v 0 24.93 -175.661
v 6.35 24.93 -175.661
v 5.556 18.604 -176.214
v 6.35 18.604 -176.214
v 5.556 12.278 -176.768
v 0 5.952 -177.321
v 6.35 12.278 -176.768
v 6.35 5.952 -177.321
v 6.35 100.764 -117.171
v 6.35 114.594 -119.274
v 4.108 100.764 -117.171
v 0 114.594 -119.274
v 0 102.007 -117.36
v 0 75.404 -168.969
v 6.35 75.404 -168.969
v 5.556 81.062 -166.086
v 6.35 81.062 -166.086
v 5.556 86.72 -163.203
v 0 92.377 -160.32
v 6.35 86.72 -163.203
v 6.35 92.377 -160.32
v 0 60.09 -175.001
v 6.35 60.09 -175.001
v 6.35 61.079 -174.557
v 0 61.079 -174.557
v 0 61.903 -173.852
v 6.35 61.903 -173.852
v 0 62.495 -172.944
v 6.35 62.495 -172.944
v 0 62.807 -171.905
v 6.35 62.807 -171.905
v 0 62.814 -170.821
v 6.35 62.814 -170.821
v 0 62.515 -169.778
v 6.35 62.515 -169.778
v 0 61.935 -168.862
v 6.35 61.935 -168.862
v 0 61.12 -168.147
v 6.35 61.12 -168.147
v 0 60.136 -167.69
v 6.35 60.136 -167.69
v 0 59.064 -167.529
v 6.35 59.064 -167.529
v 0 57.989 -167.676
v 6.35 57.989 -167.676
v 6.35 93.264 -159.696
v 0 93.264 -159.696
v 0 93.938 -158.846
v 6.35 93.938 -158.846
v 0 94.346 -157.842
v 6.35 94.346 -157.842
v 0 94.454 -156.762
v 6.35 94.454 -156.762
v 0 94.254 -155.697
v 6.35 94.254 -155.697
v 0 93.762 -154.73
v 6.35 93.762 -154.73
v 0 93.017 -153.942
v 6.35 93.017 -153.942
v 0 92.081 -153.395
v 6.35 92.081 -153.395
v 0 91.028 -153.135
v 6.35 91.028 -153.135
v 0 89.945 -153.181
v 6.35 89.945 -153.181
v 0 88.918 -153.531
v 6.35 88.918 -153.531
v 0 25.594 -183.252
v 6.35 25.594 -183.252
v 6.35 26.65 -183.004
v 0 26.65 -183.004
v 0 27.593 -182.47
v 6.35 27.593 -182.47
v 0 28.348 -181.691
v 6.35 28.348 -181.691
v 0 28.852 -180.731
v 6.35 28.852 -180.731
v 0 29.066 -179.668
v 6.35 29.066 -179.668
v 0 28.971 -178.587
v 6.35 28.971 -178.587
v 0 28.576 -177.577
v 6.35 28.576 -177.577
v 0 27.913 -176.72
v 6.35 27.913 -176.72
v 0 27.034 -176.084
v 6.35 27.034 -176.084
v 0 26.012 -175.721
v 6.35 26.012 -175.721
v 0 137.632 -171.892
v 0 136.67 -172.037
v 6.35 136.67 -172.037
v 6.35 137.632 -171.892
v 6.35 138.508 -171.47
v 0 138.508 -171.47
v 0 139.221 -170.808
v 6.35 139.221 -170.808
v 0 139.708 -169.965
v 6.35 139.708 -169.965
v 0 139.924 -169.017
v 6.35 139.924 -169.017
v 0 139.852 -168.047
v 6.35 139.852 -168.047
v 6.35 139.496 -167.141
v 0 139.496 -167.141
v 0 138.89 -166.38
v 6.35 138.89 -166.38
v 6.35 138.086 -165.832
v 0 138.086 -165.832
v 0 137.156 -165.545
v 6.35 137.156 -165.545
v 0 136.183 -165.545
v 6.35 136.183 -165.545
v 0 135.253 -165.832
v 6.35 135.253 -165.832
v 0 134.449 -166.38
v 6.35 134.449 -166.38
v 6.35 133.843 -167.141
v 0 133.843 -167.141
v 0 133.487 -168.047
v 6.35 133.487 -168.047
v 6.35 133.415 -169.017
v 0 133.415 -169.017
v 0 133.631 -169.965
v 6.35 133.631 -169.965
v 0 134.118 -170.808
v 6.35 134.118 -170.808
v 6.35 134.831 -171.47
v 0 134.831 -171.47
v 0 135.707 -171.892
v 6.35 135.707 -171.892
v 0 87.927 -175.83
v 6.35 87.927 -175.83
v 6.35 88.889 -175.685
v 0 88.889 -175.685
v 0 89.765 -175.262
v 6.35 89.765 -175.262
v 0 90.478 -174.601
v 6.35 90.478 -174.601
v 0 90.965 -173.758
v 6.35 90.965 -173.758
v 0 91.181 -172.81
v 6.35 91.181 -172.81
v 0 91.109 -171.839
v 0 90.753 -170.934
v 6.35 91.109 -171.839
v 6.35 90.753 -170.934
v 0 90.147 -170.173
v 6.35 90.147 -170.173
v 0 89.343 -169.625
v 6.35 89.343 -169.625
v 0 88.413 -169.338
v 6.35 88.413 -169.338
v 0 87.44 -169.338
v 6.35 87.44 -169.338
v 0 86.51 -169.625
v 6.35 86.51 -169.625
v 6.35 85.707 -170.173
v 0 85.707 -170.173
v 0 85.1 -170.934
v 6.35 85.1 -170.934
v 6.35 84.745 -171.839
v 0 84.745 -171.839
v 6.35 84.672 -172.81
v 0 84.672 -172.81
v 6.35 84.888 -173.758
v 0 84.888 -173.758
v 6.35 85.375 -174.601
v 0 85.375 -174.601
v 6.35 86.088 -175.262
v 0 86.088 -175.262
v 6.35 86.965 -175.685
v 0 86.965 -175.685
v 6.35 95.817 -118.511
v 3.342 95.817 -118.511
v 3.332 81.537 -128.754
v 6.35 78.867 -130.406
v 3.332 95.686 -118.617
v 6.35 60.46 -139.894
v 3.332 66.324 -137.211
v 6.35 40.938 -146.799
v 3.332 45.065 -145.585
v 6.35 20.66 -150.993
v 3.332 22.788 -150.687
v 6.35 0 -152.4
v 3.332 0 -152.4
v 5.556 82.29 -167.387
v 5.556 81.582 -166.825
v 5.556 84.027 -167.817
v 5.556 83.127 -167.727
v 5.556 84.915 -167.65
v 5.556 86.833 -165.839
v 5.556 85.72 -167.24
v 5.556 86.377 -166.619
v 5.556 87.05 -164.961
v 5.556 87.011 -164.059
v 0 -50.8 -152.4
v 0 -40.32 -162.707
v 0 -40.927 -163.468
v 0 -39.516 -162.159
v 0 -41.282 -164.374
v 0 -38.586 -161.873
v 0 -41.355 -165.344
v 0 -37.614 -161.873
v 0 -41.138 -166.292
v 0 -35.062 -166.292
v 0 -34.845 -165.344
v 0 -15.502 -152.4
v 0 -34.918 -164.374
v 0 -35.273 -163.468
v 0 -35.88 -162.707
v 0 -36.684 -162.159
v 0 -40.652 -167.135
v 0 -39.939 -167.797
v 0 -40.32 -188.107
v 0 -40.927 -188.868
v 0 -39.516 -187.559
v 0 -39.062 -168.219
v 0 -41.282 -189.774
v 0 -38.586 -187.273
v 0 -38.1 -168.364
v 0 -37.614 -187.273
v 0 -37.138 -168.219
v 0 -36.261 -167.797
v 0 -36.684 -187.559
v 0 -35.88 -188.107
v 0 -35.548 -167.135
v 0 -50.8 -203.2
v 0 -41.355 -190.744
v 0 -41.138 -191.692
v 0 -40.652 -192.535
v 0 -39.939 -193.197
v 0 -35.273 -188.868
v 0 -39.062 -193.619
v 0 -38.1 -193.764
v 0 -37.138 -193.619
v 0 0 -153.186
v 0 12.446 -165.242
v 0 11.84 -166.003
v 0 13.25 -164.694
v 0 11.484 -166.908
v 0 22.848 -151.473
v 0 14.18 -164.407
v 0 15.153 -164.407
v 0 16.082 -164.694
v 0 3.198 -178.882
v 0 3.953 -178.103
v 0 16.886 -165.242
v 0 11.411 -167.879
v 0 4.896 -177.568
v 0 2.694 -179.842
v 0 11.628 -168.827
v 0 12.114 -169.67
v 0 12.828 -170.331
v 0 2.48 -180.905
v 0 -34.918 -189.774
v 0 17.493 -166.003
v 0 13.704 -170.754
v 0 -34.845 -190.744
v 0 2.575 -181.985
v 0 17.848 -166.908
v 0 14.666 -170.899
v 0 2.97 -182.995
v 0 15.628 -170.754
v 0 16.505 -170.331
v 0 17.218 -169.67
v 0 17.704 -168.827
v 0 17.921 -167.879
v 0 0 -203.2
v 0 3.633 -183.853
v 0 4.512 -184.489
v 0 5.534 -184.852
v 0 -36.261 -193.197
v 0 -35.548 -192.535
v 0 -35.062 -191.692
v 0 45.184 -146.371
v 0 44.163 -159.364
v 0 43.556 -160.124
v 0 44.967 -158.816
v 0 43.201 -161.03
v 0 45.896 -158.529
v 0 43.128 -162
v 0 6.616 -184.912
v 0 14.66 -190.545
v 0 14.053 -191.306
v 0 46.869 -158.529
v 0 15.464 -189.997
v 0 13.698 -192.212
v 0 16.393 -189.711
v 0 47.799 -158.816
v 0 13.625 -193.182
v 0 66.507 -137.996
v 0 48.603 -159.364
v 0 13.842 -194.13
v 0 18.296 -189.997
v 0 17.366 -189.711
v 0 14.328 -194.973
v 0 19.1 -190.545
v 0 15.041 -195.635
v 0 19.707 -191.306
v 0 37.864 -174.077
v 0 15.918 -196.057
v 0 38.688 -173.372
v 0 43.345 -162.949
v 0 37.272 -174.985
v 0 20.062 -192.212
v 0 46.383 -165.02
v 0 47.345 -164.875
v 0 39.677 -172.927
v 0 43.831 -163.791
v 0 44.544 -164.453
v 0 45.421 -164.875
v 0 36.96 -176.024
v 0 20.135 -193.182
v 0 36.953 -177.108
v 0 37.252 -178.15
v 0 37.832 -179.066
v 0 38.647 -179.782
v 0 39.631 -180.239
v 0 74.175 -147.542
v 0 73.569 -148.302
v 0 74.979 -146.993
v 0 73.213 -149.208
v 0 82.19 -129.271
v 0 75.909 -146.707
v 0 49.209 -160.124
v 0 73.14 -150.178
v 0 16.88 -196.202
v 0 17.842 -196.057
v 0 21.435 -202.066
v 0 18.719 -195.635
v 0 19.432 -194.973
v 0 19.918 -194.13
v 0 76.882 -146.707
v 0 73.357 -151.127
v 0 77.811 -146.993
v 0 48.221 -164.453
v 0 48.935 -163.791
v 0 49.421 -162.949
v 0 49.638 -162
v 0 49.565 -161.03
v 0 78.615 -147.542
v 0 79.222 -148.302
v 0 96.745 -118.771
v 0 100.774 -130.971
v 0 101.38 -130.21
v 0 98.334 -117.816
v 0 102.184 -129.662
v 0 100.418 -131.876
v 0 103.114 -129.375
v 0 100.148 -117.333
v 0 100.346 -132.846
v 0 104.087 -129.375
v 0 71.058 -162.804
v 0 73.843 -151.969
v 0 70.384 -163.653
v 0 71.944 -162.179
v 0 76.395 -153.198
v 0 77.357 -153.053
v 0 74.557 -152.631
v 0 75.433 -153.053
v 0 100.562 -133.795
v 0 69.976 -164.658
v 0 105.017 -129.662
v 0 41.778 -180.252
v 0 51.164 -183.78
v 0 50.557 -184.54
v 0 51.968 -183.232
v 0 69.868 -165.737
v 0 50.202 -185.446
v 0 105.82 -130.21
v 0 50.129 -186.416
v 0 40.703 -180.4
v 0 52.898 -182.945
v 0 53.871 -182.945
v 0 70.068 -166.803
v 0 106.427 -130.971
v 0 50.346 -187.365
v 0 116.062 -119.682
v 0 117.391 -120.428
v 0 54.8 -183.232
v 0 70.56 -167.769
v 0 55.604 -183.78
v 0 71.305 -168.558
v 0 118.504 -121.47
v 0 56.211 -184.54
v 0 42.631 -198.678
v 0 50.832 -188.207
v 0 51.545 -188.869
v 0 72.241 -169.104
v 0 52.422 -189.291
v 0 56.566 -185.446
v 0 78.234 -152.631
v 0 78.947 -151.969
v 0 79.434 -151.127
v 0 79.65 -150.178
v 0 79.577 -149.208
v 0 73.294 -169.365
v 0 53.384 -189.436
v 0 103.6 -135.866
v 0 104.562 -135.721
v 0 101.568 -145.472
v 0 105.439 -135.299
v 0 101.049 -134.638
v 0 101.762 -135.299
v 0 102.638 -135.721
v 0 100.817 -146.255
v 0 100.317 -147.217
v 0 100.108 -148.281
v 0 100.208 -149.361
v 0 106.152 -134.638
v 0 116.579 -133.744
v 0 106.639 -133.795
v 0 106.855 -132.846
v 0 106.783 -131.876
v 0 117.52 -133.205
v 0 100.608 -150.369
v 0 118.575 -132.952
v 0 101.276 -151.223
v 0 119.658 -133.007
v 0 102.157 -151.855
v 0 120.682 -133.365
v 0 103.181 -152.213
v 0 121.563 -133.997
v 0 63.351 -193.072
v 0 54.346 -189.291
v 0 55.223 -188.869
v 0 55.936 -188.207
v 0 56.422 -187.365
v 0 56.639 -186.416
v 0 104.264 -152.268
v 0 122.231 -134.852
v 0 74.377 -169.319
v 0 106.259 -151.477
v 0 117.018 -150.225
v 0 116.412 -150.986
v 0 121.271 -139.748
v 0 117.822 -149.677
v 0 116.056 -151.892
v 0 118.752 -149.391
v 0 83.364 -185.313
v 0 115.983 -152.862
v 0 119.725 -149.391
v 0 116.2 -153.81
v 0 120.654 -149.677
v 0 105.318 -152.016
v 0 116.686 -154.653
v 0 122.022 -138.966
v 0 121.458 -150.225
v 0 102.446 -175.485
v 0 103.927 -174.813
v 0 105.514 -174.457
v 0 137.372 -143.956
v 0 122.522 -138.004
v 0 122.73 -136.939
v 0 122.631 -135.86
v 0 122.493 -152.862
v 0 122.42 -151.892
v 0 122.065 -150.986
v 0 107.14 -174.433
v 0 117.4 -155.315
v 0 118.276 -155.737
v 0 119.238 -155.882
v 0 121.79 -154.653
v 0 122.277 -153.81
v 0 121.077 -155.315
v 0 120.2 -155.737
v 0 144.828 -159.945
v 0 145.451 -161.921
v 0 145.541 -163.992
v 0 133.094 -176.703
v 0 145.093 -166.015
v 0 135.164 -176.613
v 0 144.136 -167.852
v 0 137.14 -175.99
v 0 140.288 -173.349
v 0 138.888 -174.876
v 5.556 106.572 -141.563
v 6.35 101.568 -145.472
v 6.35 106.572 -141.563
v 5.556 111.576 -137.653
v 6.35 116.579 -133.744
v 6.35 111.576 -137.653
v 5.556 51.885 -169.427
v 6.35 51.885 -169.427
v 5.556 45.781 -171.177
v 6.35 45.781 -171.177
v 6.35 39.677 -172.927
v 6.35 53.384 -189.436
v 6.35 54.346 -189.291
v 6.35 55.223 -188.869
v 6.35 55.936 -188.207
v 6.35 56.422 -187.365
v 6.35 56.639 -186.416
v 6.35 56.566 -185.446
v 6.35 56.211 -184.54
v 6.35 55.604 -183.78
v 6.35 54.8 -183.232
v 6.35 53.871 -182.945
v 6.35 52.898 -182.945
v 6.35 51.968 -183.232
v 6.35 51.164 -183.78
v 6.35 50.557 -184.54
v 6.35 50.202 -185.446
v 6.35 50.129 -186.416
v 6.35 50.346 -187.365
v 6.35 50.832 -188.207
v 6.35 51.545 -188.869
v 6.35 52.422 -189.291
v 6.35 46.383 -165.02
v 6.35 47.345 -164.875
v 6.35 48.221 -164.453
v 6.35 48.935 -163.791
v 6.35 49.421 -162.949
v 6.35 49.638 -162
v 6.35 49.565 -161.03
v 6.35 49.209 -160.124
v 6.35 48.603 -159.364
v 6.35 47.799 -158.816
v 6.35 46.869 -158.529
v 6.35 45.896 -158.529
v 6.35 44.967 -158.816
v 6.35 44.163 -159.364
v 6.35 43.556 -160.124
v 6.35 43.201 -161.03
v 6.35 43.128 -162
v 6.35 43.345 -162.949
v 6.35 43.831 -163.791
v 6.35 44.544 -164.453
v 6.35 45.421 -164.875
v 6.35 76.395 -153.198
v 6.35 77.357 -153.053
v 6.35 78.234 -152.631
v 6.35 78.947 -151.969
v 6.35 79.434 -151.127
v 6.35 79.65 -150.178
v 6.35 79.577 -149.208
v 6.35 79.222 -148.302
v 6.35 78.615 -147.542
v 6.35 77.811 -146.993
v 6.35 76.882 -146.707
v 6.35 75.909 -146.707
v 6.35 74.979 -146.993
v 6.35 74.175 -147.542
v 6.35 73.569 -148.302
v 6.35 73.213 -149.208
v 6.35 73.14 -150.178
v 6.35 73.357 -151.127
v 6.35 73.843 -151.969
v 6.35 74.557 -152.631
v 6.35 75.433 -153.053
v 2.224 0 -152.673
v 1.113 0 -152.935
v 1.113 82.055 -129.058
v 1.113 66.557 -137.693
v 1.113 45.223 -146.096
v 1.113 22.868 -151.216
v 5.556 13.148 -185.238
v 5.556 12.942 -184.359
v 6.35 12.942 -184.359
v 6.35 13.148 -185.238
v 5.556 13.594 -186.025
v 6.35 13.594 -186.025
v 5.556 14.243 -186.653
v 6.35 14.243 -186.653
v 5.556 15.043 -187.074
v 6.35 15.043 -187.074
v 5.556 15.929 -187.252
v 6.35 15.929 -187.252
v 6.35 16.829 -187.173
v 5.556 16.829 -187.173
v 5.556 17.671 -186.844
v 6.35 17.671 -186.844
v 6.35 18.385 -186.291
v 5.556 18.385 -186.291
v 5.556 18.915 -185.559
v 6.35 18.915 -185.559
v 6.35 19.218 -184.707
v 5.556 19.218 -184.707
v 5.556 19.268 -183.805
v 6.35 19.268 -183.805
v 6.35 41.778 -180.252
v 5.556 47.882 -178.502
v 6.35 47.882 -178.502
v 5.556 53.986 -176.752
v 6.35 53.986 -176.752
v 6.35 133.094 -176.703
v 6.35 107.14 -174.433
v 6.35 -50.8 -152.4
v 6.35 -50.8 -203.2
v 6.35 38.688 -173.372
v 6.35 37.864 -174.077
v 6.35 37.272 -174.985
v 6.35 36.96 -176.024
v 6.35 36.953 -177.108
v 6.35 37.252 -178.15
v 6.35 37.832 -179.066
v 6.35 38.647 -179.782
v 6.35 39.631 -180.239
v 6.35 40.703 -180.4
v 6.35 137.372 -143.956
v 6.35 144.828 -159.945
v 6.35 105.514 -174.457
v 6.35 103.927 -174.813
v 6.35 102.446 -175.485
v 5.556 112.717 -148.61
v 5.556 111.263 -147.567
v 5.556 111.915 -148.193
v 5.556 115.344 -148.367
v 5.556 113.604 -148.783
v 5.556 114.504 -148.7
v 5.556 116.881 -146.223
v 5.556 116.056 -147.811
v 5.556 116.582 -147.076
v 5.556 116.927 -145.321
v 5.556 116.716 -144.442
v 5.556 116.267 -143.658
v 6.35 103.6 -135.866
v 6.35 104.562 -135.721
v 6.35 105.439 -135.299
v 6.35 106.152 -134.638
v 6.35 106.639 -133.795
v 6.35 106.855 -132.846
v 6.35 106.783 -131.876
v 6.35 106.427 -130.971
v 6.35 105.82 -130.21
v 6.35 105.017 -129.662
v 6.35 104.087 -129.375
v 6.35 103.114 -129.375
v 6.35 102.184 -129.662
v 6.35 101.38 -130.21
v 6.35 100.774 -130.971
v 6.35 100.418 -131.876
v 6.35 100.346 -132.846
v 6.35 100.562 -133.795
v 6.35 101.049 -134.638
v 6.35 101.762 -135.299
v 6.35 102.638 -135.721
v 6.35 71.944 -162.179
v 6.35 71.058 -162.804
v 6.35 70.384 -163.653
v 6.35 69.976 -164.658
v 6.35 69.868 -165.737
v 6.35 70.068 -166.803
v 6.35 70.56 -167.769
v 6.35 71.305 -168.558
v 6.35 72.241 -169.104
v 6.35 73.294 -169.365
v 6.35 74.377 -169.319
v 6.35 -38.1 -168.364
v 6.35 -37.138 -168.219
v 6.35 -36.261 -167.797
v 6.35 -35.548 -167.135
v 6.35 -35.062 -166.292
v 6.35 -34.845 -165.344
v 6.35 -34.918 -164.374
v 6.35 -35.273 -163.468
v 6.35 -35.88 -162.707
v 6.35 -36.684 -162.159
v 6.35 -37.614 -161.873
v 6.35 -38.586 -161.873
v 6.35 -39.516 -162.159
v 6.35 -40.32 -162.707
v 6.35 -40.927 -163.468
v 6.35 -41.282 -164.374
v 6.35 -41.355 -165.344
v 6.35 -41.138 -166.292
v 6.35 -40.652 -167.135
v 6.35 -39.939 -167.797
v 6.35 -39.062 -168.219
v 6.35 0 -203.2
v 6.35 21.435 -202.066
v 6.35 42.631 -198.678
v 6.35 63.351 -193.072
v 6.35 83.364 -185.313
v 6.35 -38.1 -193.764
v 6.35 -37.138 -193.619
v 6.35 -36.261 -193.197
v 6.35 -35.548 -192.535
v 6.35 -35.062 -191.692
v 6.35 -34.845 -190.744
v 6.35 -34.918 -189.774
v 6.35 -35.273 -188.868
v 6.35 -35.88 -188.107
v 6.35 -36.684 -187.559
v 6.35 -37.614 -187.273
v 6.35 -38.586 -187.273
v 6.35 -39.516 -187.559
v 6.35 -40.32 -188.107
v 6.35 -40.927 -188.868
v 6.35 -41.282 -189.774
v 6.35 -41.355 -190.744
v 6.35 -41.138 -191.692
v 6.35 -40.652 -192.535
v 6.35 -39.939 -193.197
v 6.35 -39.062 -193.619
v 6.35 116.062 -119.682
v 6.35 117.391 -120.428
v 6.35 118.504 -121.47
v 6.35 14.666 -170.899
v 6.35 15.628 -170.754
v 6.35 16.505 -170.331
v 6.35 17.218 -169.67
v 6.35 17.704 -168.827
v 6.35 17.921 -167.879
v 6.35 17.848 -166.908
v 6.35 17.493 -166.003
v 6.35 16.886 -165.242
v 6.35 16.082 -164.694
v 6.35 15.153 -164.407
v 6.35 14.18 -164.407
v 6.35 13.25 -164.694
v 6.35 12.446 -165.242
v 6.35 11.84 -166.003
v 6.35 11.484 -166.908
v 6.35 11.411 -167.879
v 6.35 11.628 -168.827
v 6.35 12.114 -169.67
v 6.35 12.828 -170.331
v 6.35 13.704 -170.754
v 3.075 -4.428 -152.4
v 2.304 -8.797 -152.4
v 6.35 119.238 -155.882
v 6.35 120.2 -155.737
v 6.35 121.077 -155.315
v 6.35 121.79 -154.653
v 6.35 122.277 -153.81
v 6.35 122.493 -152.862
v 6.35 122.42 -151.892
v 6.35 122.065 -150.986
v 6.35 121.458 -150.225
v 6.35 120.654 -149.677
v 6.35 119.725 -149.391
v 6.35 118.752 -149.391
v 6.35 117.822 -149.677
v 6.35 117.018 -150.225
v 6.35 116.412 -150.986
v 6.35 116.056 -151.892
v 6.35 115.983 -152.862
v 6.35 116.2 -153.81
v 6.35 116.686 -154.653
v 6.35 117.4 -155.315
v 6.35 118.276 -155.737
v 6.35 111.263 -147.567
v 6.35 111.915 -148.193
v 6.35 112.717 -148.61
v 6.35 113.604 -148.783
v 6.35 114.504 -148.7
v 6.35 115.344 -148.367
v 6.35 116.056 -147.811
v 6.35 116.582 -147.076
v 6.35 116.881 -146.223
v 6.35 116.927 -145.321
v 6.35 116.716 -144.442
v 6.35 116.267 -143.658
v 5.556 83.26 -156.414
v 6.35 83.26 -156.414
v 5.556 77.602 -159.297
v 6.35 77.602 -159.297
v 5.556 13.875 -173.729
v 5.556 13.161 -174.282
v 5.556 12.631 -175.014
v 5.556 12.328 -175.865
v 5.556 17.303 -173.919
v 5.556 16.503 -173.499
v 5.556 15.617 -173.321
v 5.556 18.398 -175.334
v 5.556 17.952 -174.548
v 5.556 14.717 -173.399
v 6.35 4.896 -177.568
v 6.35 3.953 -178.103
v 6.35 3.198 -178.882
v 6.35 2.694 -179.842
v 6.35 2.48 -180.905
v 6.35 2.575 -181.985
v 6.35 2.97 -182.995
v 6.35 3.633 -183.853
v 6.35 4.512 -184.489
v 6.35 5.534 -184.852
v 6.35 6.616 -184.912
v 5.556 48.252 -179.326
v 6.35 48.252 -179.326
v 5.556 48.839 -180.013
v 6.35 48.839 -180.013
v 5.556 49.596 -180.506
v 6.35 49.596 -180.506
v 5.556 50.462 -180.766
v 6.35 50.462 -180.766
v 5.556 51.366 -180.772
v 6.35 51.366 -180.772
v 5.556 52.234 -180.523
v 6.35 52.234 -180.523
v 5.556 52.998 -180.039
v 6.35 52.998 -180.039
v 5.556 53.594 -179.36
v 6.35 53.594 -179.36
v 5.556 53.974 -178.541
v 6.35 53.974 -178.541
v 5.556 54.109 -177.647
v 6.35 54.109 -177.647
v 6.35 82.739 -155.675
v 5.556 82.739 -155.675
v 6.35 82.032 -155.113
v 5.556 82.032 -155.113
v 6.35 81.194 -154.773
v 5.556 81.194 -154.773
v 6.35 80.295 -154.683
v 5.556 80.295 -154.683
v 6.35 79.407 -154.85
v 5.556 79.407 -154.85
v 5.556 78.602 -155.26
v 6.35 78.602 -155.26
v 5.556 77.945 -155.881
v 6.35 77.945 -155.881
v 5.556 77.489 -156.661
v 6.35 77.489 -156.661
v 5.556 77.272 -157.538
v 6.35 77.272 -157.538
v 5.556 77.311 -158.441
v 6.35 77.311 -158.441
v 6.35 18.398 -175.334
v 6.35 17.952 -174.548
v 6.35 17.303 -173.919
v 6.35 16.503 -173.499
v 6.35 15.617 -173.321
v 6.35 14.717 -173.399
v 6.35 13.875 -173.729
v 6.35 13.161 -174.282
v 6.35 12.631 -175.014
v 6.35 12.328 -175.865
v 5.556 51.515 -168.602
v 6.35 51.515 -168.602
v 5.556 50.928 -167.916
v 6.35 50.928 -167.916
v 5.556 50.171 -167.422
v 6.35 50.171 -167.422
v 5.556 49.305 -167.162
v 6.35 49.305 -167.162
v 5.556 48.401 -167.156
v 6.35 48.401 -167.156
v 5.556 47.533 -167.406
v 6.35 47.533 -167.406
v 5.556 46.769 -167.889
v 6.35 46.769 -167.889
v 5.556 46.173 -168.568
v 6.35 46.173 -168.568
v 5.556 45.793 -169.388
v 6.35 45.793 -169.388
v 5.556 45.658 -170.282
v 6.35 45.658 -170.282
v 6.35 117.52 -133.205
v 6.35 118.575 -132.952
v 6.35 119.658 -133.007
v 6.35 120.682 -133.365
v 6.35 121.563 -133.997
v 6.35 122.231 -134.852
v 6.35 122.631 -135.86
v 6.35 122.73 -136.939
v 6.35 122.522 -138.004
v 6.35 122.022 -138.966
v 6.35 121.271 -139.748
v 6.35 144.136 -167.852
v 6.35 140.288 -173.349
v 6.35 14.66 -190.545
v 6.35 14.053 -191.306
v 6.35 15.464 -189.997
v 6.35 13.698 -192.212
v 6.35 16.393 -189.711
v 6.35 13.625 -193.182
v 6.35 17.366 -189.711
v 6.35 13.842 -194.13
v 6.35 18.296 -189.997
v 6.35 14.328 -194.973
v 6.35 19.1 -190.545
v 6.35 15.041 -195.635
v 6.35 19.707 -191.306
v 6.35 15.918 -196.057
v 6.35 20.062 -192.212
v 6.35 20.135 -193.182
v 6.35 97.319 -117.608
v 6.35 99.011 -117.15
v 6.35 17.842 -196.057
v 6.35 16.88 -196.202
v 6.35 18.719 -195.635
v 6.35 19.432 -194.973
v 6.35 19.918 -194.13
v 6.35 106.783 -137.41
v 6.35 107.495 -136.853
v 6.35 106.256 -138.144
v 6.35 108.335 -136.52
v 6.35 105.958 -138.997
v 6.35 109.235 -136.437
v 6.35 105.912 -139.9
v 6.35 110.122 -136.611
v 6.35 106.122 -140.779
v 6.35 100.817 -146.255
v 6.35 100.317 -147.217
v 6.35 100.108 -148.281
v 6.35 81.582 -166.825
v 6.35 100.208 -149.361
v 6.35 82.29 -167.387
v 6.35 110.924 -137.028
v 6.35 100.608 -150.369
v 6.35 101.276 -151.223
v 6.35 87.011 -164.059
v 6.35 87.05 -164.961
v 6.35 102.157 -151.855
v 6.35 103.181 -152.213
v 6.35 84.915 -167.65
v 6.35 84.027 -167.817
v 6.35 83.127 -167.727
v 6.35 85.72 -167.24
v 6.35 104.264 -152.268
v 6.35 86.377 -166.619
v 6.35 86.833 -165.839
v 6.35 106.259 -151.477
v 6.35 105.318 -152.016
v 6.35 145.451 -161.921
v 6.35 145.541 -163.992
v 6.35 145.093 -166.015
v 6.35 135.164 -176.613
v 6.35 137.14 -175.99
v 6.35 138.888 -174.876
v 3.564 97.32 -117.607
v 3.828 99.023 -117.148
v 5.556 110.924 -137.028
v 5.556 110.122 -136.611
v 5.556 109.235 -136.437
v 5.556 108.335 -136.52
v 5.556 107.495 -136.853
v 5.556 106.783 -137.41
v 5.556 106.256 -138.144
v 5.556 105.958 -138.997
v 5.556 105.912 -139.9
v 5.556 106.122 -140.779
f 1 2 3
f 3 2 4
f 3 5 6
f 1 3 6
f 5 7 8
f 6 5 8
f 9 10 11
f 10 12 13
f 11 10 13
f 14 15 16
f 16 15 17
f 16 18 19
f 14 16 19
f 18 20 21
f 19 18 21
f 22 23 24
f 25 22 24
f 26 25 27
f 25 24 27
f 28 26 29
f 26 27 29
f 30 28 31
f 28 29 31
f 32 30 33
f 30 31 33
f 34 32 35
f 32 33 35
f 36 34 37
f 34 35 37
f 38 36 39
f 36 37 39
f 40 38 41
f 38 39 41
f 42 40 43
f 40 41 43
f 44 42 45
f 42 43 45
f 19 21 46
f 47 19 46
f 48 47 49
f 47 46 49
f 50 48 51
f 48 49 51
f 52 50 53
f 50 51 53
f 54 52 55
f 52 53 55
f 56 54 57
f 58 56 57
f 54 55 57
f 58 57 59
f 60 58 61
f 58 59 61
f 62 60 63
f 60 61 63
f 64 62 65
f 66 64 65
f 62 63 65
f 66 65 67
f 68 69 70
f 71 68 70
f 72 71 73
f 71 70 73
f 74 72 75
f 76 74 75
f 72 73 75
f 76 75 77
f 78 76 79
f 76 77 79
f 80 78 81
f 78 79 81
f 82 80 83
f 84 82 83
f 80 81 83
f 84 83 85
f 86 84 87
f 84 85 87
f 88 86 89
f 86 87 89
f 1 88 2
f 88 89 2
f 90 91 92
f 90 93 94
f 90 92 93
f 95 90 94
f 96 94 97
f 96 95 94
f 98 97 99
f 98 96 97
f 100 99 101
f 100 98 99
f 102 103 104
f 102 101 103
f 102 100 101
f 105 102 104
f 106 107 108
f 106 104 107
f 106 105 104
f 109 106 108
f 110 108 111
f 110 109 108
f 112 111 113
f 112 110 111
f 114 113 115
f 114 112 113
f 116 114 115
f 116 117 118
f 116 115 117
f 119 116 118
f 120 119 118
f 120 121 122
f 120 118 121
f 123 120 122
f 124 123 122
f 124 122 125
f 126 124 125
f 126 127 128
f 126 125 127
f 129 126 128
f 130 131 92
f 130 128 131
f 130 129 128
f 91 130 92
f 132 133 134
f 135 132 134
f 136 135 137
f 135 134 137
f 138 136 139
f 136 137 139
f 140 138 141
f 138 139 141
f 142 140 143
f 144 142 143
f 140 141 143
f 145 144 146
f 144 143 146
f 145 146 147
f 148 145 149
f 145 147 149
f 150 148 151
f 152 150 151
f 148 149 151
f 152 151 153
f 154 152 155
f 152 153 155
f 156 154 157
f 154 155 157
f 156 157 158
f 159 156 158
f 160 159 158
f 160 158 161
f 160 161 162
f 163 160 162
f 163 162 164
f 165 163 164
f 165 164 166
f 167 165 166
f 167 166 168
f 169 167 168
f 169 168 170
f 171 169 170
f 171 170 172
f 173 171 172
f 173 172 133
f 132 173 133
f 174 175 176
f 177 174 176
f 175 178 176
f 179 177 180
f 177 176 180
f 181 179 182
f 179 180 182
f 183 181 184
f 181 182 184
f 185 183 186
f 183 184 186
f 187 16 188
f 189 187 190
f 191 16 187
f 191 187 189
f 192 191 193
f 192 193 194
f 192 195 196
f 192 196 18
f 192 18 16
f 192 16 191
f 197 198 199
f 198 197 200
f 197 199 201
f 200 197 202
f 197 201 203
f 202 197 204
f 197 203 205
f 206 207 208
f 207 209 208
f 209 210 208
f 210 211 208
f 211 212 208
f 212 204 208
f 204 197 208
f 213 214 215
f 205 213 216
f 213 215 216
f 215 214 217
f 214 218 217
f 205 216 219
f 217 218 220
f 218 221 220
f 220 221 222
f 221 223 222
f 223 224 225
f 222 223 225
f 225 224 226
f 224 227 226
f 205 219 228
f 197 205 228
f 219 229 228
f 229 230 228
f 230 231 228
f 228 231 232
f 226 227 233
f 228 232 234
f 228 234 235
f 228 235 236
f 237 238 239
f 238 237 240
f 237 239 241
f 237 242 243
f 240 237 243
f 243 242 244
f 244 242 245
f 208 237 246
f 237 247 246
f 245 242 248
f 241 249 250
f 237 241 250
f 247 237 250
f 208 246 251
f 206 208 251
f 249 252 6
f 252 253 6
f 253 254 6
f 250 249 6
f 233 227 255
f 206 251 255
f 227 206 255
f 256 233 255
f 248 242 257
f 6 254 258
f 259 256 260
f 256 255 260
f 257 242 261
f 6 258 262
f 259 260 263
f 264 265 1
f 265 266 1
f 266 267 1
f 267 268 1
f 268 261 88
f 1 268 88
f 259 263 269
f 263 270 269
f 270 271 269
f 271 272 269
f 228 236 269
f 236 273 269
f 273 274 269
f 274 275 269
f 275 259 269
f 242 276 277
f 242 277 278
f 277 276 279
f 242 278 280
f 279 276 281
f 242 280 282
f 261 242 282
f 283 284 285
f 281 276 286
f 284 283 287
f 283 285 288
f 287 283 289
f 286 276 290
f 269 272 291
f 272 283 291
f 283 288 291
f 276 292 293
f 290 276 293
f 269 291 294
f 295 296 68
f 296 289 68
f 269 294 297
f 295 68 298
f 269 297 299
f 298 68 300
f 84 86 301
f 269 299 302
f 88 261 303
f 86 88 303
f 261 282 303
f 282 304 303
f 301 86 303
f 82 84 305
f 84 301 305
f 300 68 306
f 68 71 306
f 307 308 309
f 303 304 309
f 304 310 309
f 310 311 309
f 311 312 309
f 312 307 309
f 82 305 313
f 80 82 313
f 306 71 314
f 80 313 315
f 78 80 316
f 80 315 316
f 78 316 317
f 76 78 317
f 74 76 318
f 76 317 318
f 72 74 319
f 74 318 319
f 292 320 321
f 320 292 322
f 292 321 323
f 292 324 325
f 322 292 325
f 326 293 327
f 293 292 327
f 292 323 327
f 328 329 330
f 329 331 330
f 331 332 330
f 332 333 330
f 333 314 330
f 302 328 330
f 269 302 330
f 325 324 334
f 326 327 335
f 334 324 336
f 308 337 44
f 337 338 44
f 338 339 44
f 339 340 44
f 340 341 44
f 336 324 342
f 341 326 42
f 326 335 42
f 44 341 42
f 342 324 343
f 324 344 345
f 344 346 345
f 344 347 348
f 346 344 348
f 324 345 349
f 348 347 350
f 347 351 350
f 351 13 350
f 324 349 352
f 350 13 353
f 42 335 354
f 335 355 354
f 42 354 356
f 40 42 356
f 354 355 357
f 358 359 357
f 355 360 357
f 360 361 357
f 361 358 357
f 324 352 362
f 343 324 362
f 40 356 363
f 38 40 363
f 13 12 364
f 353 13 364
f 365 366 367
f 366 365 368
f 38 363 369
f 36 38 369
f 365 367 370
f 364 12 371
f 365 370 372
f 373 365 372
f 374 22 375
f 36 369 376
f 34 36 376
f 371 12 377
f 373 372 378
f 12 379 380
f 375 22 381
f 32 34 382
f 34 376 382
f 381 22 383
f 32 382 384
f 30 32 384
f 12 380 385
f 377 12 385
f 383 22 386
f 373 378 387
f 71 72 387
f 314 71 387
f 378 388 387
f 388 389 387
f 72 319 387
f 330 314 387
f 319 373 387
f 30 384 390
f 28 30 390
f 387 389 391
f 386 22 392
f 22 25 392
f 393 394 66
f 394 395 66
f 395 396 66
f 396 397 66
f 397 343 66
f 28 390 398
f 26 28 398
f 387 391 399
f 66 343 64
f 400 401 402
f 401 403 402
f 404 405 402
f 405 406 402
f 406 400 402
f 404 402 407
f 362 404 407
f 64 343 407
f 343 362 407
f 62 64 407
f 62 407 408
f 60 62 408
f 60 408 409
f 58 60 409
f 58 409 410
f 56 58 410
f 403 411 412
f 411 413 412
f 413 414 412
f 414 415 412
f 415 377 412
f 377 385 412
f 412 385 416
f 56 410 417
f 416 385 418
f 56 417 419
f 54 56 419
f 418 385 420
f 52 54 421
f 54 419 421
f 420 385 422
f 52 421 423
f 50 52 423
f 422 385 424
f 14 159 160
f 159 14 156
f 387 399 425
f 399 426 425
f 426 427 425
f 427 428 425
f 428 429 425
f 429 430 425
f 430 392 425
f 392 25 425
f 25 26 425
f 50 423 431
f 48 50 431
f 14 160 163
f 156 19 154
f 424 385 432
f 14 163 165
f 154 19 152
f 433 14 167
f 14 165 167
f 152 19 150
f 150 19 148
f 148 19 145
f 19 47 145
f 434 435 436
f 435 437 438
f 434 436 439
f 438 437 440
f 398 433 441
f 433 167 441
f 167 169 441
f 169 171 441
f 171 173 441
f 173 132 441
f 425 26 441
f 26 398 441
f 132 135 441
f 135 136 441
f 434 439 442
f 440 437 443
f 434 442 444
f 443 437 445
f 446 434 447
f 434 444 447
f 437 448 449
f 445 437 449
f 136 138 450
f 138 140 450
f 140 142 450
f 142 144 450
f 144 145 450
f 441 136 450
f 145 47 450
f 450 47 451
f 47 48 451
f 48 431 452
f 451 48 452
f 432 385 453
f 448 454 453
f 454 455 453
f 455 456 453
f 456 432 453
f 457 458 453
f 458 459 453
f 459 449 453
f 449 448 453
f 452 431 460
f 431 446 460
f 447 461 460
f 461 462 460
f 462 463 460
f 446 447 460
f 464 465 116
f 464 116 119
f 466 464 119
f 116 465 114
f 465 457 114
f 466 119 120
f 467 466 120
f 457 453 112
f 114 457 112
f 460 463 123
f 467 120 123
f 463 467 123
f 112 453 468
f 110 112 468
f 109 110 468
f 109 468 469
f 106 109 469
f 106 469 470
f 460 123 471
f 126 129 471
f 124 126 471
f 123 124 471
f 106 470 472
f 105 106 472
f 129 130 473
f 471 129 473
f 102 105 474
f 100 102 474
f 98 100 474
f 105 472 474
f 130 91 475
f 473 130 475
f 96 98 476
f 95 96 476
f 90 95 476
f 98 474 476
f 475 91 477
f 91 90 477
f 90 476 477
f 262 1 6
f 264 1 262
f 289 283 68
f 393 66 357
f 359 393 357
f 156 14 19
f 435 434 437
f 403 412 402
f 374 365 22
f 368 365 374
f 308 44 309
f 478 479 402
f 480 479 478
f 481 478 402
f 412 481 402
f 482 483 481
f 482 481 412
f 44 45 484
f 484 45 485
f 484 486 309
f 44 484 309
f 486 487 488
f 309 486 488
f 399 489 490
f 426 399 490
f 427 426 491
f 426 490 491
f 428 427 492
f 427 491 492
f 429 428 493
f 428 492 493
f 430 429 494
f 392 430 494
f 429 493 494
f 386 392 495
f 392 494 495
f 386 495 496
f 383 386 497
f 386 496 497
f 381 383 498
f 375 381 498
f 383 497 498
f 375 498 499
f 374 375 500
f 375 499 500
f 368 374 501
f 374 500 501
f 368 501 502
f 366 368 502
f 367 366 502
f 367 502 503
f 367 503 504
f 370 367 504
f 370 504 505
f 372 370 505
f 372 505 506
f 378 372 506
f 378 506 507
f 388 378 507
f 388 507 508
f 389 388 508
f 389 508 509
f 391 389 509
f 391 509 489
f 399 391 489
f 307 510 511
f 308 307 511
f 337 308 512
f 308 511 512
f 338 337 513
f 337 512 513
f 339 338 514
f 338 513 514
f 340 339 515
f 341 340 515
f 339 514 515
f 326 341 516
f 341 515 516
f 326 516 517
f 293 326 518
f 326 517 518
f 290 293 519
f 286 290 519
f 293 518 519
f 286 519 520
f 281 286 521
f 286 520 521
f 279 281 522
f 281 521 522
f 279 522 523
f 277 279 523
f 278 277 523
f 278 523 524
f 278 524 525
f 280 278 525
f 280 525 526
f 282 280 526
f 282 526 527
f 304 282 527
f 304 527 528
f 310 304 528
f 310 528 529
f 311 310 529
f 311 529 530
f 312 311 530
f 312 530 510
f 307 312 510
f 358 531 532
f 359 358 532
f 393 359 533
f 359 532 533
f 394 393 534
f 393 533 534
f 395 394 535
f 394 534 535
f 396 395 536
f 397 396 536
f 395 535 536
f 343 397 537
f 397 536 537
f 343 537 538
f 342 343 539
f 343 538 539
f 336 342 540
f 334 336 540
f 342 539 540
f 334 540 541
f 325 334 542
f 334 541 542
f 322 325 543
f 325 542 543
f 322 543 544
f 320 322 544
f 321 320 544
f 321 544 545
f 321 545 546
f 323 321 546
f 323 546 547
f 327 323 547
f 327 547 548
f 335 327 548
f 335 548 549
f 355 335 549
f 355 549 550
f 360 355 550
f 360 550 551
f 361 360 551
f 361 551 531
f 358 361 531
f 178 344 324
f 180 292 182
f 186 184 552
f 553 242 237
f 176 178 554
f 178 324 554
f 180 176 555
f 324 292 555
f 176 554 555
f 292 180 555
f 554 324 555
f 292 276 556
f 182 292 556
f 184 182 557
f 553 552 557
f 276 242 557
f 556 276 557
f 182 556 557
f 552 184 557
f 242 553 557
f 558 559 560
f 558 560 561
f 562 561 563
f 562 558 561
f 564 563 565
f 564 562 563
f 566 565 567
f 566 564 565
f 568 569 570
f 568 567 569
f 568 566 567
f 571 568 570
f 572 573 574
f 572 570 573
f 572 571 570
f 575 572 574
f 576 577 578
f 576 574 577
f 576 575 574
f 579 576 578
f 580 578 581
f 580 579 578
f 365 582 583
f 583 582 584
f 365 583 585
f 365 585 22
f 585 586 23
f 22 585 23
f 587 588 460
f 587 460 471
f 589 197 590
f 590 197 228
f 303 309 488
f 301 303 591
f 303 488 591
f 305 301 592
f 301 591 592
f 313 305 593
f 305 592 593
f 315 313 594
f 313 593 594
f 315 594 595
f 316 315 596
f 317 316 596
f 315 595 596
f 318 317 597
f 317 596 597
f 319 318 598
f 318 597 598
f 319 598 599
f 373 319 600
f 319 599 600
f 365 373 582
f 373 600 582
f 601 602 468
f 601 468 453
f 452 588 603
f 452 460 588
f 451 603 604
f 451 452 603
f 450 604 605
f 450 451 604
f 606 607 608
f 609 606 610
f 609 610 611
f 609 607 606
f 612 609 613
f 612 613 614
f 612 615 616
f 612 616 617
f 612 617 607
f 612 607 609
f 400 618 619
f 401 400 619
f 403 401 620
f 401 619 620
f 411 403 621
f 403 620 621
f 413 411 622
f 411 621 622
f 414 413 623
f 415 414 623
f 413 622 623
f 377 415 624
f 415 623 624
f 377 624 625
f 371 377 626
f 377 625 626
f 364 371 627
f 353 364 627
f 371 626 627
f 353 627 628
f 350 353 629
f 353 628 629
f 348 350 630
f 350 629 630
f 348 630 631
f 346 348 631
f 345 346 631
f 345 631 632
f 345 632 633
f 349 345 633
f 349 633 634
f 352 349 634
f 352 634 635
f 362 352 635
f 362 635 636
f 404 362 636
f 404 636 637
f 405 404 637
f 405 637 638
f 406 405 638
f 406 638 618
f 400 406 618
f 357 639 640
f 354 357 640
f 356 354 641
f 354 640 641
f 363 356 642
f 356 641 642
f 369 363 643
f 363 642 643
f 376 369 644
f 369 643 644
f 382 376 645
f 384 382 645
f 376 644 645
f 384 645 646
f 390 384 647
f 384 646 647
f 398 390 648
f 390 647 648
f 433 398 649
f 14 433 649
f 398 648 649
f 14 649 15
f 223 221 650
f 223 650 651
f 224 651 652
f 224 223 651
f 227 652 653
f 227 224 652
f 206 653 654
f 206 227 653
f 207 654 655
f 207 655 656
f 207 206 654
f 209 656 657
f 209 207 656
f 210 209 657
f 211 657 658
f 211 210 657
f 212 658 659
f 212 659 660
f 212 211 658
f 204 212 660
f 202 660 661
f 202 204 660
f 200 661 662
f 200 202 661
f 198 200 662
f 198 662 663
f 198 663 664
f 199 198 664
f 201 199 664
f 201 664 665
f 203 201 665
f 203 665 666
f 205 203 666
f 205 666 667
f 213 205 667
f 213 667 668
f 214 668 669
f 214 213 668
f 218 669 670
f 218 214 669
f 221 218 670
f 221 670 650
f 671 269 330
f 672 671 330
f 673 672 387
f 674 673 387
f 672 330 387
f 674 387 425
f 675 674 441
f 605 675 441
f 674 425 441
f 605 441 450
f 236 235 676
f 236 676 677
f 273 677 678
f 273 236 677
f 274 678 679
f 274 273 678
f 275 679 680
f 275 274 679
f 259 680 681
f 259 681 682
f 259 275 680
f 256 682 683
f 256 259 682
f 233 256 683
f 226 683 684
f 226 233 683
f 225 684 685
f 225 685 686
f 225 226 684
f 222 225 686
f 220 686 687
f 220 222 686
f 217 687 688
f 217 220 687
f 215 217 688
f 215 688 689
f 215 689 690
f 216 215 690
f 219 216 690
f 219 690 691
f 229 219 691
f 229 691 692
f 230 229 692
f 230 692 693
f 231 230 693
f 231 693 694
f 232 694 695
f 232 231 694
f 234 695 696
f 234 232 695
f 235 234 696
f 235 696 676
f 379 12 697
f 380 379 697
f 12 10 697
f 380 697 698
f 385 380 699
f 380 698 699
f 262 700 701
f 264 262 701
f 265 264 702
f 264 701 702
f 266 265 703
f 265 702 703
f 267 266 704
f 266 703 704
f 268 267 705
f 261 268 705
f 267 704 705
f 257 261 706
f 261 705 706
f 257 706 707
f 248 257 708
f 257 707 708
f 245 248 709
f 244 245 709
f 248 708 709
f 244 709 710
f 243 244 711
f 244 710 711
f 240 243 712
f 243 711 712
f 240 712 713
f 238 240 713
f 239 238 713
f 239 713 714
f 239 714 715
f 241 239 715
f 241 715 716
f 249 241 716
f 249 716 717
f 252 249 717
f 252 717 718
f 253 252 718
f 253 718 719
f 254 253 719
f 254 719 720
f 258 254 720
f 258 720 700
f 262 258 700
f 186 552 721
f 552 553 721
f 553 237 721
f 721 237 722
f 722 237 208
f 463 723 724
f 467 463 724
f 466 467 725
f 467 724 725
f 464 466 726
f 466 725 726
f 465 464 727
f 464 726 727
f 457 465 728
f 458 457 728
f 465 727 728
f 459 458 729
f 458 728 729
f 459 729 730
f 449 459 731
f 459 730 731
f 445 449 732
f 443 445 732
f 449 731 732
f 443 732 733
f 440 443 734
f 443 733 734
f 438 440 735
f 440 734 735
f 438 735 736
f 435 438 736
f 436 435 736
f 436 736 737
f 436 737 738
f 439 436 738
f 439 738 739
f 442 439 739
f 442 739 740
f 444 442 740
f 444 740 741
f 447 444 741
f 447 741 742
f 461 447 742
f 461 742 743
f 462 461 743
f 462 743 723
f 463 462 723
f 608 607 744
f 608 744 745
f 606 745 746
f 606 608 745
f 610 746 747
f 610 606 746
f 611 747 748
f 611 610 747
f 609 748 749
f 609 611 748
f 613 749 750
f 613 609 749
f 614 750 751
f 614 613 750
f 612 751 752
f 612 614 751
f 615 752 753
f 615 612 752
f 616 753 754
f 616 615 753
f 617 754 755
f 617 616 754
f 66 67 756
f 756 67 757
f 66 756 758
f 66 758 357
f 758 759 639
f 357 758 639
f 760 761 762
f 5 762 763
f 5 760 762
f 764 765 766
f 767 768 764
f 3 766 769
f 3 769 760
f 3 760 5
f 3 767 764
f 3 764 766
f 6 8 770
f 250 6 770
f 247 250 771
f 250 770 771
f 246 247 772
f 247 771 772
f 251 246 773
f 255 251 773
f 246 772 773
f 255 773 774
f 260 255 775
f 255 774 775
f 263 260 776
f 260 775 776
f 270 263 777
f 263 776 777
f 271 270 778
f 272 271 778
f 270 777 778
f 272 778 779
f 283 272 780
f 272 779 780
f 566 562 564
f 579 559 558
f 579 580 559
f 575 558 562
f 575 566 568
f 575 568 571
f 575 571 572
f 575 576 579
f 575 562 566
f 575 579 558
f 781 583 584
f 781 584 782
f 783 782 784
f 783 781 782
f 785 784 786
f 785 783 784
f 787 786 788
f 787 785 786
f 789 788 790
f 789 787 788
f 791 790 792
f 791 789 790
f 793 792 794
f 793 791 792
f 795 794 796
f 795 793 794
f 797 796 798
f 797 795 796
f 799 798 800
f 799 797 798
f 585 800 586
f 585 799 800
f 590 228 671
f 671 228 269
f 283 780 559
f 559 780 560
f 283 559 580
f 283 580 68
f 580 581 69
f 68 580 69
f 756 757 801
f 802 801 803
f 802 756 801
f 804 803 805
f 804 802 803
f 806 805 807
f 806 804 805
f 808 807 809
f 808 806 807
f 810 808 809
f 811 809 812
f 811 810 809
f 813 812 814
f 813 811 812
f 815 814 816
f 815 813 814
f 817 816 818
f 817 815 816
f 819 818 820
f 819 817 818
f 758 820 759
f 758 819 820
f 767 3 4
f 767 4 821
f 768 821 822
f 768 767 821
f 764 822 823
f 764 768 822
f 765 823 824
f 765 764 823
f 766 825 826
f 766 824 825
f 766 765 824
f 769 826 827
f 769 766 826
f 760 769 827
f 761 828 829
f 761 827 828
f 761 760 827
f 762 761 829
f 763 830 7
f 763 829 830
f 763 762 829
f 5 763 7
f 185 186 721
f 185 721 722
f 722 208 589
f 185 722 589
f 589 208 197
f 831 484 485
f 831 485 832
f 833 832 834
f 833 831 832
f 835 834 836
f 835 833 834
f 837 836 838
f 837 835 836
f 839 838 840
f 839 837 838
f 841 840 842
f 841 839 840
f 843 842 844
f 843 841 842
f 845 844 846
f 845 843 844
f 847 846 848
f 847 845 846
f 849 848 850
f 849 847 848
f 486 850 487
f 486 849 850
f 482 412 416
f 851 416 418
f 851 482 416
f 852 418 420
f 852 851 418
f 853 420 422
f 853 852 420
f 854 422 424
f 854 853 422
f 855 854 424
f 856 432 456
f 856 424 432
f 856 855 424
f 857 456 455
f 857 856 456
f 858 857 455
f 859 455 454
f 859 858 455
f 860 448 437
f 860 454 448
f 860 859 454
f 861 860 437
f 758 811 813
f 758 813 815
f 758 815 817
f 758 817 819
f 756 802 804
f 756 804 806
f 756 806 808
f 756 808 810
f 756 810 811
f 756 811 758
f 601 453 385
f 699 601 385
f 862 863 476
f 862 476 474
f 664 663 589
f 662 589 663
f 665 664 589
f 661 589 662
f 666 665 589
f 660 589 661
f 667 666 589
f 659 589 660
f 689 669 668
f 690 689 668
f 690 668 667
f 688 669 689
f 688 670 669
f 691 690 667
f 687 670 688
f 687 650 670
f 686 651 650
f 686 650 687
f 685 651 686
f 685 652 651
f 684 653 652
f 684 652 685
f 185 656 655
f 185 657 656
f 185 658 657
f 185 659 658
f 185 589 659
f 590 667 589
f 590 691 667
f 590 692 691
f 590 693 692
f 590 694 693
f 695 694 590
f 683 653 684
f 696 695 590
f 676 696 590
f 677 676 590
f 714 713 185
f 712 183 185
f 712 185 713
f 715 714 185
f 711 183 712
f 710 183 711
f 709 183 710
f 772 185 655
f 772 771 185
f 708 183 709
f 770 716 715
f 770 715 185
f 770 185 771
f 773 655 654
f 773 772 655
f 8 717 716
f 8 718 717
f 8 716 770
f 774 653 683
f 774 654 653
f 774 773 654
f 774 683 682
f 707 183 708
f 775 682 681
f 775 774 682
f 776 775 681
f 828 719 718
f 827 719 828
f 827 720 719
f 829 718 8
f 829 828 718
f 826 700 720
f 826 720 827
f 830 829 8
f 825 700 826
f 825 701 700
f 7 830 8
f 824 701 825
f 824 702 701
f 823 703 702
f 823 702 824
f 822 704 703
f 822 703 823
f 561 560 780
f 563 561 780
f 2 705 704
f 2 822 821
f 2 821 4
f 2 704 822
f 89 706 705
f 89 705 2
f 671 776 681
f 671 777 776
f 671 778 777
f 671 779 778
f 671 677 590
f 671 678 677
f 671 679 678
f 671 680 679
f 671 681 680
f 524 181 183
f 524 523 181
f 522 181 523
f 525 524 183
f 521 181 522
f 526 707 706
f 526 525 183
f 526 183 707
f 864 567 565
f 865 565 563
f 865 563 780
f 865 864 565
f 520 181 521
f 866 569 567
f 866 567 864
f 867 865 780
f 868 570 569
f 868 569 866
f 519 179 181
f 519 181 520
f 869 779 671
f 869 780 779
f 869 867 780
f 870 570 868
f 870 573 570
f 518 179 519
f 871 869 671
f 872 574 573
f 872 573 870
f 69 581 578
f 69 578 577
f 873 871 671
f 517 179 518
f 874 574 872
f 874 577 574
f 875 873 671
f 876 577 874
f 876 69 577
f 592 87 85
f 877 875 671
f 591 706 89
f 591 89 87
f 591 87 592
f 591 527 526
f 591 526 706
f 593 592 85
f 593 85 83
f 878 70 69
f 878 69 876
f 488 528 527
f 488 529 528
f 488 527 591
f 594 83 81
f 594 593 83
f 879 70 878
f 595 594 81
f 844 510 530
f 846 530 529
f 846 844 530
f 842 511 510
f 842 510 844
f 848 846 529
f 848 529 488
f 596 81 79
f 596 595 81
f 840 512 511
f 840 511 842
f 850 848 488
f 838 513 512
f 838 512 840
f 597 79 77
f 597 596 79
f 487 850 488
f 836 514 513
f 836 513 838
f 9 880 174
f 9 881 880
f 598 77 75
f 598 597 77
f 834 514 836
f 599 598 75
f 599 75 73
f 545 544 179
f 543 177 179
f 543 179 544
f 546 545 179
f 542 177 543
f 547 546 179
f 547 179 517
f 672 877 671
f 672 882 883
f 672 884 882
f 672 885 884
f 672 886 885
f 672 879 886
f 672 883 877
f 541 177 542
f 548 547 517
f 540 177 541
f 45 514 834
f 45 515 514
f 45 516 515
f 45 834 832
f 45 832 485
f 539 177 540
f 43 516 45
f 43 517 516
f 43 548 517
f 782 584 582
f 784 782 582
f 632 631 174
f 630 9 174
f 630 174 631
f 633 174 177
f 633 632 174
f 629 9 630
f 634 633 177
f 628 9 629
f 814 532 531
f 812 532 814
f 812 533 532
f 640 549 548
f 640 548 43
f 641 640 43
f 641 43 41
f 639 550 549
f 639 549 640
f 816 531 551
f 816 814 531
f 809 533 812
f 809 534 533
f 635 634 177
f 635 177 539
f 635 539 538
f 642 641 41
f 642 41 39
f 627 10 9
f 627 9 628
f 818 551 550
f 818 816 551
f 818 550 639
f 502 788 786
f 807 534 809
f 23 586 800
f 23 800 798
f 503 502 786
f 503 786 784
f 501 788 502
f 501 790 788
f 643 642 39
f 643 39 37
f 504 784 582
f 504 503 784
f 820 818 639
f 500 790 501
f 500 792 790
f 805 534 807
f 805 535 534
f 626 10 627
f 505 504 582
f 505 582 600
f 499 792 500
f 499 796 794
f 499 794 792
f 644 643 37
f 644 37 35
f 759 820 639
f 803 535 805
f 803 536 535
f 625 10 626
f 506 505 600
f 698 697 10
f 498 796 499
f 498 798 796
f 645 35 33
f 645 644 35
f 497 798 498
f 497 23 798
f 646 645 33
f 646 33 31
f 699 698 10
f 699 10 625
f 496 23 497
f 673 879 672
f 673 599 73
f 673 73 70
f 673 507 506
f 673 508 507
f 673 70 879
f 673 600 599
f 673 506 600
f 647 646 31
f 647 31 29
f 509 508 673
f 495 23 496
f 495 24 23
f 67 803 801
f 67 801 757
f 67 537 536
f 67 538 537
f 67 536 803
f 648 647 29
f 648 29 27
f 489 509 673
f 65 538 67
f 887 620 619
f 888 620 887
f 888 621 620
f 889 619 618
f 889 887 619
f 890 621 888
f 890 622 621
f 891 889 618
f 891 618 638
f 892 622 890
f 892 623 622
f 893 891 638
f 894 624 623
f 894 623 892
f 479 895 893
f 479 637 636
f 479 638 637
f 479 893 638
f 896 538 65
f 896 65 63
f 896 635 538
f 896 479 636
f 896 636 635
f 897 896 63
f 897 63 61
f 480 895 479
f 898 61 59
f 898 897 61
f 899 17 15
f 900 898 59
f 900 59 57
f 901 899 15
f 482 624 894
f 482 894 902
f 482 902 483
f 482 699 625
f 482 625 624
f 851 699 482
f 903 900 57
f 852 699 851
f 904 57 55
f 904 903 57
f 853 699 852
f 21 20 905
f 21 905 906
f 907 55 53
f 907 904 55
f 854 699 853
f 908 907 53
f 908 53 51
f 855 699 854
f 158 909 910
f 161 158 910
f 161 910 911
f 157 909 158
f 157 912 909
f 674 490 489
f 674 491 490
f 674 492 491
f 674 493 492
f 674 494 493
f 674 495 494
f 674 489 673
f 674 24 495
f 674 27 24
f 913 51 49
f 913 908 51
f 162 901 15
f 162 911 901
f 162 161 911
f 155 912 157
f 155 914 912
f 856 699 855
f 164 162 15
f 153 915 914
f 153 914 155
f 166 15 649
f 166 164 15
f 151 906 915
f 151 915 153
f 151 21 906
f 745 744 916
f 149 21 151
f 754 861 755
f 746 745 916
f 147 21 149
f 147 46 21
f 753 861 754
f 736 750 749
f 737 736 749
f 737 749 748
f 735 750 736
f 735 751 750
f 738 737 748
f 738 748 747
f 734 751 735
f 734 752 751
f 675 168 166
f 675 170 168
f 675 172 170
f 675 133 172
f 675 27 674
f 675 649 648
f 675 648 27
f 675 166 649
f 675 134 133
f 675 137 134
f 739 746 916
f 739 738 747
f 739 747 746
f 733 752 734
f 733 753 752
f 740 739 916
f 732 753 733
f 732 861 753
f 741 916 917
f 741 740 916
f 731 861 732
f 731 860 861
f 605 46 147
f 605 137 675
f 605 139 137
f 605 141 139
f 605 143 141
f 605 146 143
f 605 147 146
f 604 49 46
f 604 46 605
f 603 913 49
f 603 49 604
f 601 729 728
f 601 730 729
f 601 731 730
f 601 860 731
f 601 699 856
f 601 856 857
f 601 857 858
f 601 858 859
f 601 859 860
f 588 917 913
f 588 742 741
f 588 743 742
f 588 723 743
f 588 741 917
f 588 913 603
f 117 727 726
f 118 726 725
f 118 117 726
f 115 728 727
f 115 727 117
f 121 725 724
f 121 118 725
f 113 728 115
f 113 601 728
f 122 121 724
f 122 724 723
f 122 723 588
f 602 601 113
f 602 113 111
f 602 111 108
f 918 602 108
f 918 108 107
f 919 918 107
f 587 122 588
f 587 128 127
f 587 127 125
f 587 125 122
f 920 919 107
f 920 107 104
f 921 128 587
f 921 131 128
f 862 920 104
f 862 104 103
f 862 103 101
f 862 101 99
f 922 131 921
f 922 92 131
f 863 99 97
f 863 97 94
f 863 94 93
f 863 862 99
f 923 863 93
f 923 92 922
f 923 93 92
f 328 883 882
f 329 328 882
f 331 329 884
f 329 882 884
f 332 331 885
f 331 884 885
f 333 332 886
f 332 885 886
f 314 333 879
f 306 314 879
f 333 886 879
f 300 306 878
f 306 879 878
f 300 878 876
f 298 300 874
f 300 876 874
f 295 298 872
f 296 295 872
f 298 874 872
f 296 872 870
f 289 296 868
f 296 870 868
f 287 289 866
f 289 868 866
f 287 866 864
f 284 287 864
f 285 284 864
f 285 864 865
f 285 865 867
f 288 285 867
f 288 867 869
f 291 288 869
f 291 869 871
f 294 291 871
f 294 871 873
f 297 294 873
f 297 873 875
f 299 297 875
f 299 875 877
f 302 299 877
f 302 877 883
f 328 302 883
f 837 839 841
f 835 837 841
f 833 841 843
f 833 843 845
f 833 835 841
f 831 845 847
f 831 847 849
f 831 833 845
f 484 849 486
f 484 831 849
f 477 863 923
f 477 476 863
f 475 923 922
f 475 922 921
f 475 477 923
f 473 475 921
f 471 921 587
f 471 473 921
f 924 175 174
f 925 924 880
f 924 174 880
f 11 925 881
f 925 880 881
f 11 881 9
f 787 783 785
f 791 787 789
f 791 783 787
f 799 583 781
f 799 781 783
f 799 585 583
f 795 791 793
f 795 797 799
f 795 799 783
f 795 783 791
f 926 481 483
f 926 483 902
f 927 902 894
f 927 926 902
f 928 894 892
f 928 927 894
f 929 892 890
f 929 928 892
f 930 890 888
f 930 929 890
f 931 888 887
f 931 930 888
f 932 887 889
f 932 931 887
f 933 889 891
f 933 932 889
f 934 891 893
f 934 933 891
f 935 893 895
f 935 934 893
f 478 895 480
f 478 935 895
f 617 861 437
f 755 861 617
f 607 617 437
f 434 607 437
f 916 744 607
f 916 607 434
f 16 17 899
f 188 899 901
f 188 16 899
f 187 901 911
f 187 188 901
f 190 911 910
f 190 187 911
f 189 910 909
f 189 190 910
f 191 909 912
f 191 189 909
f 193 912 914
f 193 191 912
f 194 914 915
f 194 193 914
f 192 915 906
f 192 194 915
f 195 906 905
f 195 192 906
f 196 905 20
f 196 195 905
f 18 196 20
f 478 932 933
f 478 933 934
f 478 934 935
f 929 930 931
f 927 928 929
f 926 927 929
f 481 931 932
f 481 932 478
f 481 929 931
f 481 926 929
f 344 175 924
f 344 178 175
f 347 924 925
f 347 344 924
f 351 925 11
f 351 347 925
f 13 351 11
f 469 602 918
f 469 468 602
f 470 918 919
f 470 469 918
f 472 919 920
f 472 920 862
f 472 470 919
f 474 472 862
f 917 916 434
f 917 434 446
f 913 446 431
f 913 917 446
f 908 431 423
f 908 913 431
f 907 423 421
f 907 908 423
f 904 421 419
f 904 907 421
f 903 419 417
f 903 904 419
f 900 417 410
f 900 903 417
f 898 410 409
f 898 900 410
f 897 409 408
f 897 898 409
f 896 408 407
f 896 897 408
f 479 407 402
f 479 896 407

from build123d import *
from build123d.topology import SkipClean

# Parameters (mm, degrees)
SKETCH1_R               = 3.2639
BOSS_EXTRUDE1_DEPTH     = 6.35
FILLET1_R               = 6.35
SKETCH6_R               = 3.2639
CUT_EXTRUDE1_DEPTH      = 246.360186308
CUT_EXTRUDE2_START      = -0.79375
CUT_EXTRUDE2_DEPTH      = 10.82675
CIRPATTERN1_COUNT       = 4
CIRPATTERN1_ANGLE       = 33
BOSS_EXTRUDE2_DEPTH     = 6.35
CUT_EXTRUDE3_DEPTH      = 251.739762675
CUT_EXTRUDE3_DEPTH_BACK = 251.739762675
SKETCH9_R               = 3.2639
FILLET2_R               = 7.9375


with BuildPart() as part:
    # Sketch1 → Boss-Extrude1 (new body)
    with BuildSketch(Plane(origin=(0, 0, 0), x_dir=(0, 0, -1), z_dir=(1, 0, 0))):
        with BuildLine():
            Line((152.4, 0), (152.4, -50.8))
            Line((152.4, -50.8), (203.2, -50.8))
            Line((203.2, -50.8), (203.2, 0))
            ThreePointArc((203.2, 0), (190.945540544, 69.498493124), (155.660230842, 130.614442288))
            Line((155.660230842, 130.614442288), (143.955847531, 137.371971144))
            Line((143.955847531, 137.371971144), (119.633936462, 116.963464536))
            Line((119.633936462, 116.963464536), (116.745173131, 97.960831716))
            ThreePointArc((116.745173131, 97.960831716), (143.209155408, 52.123869843), (152.4, 0))
        make_face()
        with Locations((165.1, -38.1)):
            Circle(SKETCH1_R, mode=Mode.SUBTRACT)
        with Locations((190.5, -38.1)):
            Circle(SKETCH1_R, mode=Mode.SUBTRACT)
    extrude(amount=BOSS_EXTRUDE1_DEPTH)

    # Sketch2 → Cut-Revolve2 (revolve, cut)
    with SkipClean():  # the faces are left unmerged after this step: merging them gives an invalid solid
        with BuildSketch(Plane(origin=(0, 0, 0), x_dir=(1, 0, 0), z_dir=(0, 1, 0))):
            with BuildLine():
                Line((-143.256, 38.1), (-25.4, 38.1))
                Line((-25.4, 38.1), (92.456, 38.1))
                ThreePointArc((92.456, 38.1), (-25.4, 155.956), (-143.256, 38.1))
            make_face()
        revolve(axis=Axis((0, 0, 0), (-1, 0, 0)), mode=Mode.SUBTRACT)
    add(part.part.scale(1), mode=Mode.REPLACE)  # the faces are merged on a copy

    # Fillet1
    fillet1_edges = [part.edges().sort_by_distance(p)[0] for p in [
        (4.841164554, 97.960831716, -116.745173131),
        (1.671163996, 98.49343633, -116.826139211),
        (3.175, 116.963464536, -119.633936462),
        (3.175, 130.614442288, -155.660230842),
    ]]
    fillet(fillet1_edges, radius=FILLET1_R)

    # Sketch6 → Cut-Extrude1 (cut, through all)
    with BuildSketch(Plane(origin=(6.35, 0, 0), x_dir=(0, 0, -1), z_dir=(1, 0, 0))):
        with Locations((167.634662821, 14.666132611)):
            Circle(SKETCH6_R)
        with Locations((192.938008153, 16.879888477)):
            Circle(SKETCH6_R)
        with Locations((161.756311884, 46.38287605)):
            Circle(SKETCH6_R)
        with Locations((186.172358961, 53.384064888)):
            Circle(SKETCH6_R)
        with Locations((149.934122858, 76.395251344)):
            Circle(SKETCH6_R)
        with Locations((172.565688572, 87.926610037)):
            Circle(SKETCH6_R)
        with Locations((132.602509563, 103.60043476)):
            Circle(SKETCH6_R)
        with Locations((152.617982705, 119.238236234)):
            Circle(SKETCH6_R)
        with BuildLine():
            Line((167.676482547, 57.989309797), (172.927374175, 39.67727449))
            ThreePointArc((172.927374175, 39.67727449), (177.639959562, 37.065045754), (180.252188298, 41.777631141))
            Line((180.252188298, 41.777631141), (175.00129667, 60.089666448))
            ThreePointArc((175.00129667, 60.089666448), (170.288711283, 62.701895184), (167.676482547, 57.989309797))
        make_face()
        with BuildLine():
            Line((153.530911348, 88.918064029), (162.179430368, 71.944389743))
            ThreePointArc((162.179430368, 71.944389743), (167.303869029, 70.27935869), (168.968900082, 75.403797351))
            Line((168.968900082, 75.403797351), (160.320381062, 92.377471637))
            ThreePointArc((160.320381062, 92.377471637), (155.195942401, 94.04250269), (153.530911348, 88.918064029))
        make_face()
        with BuildLine():
            Line((175.660675238, 24.929701663), (177.320992137, 5.952192665))
            ThreePointArc((177.320992137, 5.952192665), (181.448557317, 2.488754245), (184.911995737, 6.616319424))
            Line((184.911995737, 6.616319424), (183.251678837, 25.593828423))
            ThreePointArc((183.251678837, 25.593828423), (179.124113658, 29.057266843), (175.660675238, 24.929701663))
        make_face()
        with BuildLine():
            Line((139.748391553, 121.270808146), (151.476742658, 106.25920329))
            ThreePointArc((151.476742658, 106.25920329), (150.820091907, 100.911212098), (145.472100715, 101.567862848))
            Line((145.472100715, 101.567862848), (133.74374961, 116.579467704))
            ThreePointArc((133.74374961, 116.579467704), (134.400400361, 121.927458896), (139.748391553, 121.270808146))
        make_face()
    extrude(amount=-CUT_EXTRUDE1_DEPTH, mode=Mode.SUBTRACT)

    # Sketch8 → Cut-Extrude2 (cut)
    with BuildSketch(Plane(origin=(6.35, 15.551634957, -177.756000954), x_dir=(0, 0.08715574274765883, -0.9961946980917454), z_dir=(1, 0, 0)).offset(CUT_EXTRUDE2_START)):
        with BuildLine():
            Line((6.35, 3.175), (-1.27, 3.175))
            ThreePointArc((-1.27, 3.175), (-4.445, 0), (-1.27, -3.175))
            Line((-1.27, -3.175), (6.35, -3.175))
            ThreePointArc((6.35, -3.175), (9.525, 0), (6.35, 3.175))
        make_face()
    cut_extrude2 = extrude(amount=CUT_EXTRUDE2_DEPTH, mode=Mode.SUBTRACT)

    # CirPattern1: Cut-Extrude2 ×4 about axis
    cirpattern1_axis = Axis((6.35, 0, 0), (1, 0, 0))
    for i in range(1, CIRPATTERN1_COUNT):
        add(cut_extrude2.rotate(cirpattern1_axis, i * CIRPATTERN1_ANGLE / (CIRPATTERN1_COUNT - 1)), mode=Mode.SUBTRACT)

    # Sketch11 → Boss-Extrude2 (add)
    with BuildSketch(Plane(origin=(6.35, 0, 0), x_dir=(0, 0, -1), z_dir=(1, 0, 0))):
        with BuildLine():
            Line((164.098538098, 146.764662011), (143.955847531, 137.371971144))
            Line((143.955847531, 137.371971144), (154.682623198, 131.178864325))
            ThreePointArc((154.682623198, 131.178864325), (155.603036102, 130.532446831), (156.394965882, 129.733783753))
            ThreePointArc((156.394965882, 129.733783753), (165.779619803, 117.504713343), (174.21022582, 104.599413095))
            Line((174.21022582, 104.599413095), (177.102576801, 137.659136084))
            Line((177.102576801, 137.659136084), (164.098538098, 146.764662011))
        make_face()
    extrude(amount=-BOSS_EXTRUDE2_DEPTH)

    # Sketch9 → Cut-Extrude3 (cut, two sides: drawn at the far end of the back side and taken through both)
    with BuildSketch(Plane(origin=(6.35, 0, 0), x_dir=(0, 0, -1), z_dir=(1, 0, 0)).offset(-CUT_EXTRUDE3_DEPTH_BACK)):
        with Locations((168.77278845, 136.669509324)):
            Circle(SKETCH9_R)
    extrude(amount=CUT_EXTRUDE3_DEPTH + CUT_EXTRUDE3_DEPTH_BACK, mode=Mode.SUBTRACT)

    # Fillet2
    fillet2_edges = [part.edges().sort_by_distance(p)[0] for p in [
        (3.175, 137.659136084, -177.102576801),
        (3.175, 146.764662011, -164.098538098),
        (3.175, 104.599413095, -174.21022582),
    ]]
    fillet(fillet2_edges, radius=FILLET2_R)


solid = part.part
